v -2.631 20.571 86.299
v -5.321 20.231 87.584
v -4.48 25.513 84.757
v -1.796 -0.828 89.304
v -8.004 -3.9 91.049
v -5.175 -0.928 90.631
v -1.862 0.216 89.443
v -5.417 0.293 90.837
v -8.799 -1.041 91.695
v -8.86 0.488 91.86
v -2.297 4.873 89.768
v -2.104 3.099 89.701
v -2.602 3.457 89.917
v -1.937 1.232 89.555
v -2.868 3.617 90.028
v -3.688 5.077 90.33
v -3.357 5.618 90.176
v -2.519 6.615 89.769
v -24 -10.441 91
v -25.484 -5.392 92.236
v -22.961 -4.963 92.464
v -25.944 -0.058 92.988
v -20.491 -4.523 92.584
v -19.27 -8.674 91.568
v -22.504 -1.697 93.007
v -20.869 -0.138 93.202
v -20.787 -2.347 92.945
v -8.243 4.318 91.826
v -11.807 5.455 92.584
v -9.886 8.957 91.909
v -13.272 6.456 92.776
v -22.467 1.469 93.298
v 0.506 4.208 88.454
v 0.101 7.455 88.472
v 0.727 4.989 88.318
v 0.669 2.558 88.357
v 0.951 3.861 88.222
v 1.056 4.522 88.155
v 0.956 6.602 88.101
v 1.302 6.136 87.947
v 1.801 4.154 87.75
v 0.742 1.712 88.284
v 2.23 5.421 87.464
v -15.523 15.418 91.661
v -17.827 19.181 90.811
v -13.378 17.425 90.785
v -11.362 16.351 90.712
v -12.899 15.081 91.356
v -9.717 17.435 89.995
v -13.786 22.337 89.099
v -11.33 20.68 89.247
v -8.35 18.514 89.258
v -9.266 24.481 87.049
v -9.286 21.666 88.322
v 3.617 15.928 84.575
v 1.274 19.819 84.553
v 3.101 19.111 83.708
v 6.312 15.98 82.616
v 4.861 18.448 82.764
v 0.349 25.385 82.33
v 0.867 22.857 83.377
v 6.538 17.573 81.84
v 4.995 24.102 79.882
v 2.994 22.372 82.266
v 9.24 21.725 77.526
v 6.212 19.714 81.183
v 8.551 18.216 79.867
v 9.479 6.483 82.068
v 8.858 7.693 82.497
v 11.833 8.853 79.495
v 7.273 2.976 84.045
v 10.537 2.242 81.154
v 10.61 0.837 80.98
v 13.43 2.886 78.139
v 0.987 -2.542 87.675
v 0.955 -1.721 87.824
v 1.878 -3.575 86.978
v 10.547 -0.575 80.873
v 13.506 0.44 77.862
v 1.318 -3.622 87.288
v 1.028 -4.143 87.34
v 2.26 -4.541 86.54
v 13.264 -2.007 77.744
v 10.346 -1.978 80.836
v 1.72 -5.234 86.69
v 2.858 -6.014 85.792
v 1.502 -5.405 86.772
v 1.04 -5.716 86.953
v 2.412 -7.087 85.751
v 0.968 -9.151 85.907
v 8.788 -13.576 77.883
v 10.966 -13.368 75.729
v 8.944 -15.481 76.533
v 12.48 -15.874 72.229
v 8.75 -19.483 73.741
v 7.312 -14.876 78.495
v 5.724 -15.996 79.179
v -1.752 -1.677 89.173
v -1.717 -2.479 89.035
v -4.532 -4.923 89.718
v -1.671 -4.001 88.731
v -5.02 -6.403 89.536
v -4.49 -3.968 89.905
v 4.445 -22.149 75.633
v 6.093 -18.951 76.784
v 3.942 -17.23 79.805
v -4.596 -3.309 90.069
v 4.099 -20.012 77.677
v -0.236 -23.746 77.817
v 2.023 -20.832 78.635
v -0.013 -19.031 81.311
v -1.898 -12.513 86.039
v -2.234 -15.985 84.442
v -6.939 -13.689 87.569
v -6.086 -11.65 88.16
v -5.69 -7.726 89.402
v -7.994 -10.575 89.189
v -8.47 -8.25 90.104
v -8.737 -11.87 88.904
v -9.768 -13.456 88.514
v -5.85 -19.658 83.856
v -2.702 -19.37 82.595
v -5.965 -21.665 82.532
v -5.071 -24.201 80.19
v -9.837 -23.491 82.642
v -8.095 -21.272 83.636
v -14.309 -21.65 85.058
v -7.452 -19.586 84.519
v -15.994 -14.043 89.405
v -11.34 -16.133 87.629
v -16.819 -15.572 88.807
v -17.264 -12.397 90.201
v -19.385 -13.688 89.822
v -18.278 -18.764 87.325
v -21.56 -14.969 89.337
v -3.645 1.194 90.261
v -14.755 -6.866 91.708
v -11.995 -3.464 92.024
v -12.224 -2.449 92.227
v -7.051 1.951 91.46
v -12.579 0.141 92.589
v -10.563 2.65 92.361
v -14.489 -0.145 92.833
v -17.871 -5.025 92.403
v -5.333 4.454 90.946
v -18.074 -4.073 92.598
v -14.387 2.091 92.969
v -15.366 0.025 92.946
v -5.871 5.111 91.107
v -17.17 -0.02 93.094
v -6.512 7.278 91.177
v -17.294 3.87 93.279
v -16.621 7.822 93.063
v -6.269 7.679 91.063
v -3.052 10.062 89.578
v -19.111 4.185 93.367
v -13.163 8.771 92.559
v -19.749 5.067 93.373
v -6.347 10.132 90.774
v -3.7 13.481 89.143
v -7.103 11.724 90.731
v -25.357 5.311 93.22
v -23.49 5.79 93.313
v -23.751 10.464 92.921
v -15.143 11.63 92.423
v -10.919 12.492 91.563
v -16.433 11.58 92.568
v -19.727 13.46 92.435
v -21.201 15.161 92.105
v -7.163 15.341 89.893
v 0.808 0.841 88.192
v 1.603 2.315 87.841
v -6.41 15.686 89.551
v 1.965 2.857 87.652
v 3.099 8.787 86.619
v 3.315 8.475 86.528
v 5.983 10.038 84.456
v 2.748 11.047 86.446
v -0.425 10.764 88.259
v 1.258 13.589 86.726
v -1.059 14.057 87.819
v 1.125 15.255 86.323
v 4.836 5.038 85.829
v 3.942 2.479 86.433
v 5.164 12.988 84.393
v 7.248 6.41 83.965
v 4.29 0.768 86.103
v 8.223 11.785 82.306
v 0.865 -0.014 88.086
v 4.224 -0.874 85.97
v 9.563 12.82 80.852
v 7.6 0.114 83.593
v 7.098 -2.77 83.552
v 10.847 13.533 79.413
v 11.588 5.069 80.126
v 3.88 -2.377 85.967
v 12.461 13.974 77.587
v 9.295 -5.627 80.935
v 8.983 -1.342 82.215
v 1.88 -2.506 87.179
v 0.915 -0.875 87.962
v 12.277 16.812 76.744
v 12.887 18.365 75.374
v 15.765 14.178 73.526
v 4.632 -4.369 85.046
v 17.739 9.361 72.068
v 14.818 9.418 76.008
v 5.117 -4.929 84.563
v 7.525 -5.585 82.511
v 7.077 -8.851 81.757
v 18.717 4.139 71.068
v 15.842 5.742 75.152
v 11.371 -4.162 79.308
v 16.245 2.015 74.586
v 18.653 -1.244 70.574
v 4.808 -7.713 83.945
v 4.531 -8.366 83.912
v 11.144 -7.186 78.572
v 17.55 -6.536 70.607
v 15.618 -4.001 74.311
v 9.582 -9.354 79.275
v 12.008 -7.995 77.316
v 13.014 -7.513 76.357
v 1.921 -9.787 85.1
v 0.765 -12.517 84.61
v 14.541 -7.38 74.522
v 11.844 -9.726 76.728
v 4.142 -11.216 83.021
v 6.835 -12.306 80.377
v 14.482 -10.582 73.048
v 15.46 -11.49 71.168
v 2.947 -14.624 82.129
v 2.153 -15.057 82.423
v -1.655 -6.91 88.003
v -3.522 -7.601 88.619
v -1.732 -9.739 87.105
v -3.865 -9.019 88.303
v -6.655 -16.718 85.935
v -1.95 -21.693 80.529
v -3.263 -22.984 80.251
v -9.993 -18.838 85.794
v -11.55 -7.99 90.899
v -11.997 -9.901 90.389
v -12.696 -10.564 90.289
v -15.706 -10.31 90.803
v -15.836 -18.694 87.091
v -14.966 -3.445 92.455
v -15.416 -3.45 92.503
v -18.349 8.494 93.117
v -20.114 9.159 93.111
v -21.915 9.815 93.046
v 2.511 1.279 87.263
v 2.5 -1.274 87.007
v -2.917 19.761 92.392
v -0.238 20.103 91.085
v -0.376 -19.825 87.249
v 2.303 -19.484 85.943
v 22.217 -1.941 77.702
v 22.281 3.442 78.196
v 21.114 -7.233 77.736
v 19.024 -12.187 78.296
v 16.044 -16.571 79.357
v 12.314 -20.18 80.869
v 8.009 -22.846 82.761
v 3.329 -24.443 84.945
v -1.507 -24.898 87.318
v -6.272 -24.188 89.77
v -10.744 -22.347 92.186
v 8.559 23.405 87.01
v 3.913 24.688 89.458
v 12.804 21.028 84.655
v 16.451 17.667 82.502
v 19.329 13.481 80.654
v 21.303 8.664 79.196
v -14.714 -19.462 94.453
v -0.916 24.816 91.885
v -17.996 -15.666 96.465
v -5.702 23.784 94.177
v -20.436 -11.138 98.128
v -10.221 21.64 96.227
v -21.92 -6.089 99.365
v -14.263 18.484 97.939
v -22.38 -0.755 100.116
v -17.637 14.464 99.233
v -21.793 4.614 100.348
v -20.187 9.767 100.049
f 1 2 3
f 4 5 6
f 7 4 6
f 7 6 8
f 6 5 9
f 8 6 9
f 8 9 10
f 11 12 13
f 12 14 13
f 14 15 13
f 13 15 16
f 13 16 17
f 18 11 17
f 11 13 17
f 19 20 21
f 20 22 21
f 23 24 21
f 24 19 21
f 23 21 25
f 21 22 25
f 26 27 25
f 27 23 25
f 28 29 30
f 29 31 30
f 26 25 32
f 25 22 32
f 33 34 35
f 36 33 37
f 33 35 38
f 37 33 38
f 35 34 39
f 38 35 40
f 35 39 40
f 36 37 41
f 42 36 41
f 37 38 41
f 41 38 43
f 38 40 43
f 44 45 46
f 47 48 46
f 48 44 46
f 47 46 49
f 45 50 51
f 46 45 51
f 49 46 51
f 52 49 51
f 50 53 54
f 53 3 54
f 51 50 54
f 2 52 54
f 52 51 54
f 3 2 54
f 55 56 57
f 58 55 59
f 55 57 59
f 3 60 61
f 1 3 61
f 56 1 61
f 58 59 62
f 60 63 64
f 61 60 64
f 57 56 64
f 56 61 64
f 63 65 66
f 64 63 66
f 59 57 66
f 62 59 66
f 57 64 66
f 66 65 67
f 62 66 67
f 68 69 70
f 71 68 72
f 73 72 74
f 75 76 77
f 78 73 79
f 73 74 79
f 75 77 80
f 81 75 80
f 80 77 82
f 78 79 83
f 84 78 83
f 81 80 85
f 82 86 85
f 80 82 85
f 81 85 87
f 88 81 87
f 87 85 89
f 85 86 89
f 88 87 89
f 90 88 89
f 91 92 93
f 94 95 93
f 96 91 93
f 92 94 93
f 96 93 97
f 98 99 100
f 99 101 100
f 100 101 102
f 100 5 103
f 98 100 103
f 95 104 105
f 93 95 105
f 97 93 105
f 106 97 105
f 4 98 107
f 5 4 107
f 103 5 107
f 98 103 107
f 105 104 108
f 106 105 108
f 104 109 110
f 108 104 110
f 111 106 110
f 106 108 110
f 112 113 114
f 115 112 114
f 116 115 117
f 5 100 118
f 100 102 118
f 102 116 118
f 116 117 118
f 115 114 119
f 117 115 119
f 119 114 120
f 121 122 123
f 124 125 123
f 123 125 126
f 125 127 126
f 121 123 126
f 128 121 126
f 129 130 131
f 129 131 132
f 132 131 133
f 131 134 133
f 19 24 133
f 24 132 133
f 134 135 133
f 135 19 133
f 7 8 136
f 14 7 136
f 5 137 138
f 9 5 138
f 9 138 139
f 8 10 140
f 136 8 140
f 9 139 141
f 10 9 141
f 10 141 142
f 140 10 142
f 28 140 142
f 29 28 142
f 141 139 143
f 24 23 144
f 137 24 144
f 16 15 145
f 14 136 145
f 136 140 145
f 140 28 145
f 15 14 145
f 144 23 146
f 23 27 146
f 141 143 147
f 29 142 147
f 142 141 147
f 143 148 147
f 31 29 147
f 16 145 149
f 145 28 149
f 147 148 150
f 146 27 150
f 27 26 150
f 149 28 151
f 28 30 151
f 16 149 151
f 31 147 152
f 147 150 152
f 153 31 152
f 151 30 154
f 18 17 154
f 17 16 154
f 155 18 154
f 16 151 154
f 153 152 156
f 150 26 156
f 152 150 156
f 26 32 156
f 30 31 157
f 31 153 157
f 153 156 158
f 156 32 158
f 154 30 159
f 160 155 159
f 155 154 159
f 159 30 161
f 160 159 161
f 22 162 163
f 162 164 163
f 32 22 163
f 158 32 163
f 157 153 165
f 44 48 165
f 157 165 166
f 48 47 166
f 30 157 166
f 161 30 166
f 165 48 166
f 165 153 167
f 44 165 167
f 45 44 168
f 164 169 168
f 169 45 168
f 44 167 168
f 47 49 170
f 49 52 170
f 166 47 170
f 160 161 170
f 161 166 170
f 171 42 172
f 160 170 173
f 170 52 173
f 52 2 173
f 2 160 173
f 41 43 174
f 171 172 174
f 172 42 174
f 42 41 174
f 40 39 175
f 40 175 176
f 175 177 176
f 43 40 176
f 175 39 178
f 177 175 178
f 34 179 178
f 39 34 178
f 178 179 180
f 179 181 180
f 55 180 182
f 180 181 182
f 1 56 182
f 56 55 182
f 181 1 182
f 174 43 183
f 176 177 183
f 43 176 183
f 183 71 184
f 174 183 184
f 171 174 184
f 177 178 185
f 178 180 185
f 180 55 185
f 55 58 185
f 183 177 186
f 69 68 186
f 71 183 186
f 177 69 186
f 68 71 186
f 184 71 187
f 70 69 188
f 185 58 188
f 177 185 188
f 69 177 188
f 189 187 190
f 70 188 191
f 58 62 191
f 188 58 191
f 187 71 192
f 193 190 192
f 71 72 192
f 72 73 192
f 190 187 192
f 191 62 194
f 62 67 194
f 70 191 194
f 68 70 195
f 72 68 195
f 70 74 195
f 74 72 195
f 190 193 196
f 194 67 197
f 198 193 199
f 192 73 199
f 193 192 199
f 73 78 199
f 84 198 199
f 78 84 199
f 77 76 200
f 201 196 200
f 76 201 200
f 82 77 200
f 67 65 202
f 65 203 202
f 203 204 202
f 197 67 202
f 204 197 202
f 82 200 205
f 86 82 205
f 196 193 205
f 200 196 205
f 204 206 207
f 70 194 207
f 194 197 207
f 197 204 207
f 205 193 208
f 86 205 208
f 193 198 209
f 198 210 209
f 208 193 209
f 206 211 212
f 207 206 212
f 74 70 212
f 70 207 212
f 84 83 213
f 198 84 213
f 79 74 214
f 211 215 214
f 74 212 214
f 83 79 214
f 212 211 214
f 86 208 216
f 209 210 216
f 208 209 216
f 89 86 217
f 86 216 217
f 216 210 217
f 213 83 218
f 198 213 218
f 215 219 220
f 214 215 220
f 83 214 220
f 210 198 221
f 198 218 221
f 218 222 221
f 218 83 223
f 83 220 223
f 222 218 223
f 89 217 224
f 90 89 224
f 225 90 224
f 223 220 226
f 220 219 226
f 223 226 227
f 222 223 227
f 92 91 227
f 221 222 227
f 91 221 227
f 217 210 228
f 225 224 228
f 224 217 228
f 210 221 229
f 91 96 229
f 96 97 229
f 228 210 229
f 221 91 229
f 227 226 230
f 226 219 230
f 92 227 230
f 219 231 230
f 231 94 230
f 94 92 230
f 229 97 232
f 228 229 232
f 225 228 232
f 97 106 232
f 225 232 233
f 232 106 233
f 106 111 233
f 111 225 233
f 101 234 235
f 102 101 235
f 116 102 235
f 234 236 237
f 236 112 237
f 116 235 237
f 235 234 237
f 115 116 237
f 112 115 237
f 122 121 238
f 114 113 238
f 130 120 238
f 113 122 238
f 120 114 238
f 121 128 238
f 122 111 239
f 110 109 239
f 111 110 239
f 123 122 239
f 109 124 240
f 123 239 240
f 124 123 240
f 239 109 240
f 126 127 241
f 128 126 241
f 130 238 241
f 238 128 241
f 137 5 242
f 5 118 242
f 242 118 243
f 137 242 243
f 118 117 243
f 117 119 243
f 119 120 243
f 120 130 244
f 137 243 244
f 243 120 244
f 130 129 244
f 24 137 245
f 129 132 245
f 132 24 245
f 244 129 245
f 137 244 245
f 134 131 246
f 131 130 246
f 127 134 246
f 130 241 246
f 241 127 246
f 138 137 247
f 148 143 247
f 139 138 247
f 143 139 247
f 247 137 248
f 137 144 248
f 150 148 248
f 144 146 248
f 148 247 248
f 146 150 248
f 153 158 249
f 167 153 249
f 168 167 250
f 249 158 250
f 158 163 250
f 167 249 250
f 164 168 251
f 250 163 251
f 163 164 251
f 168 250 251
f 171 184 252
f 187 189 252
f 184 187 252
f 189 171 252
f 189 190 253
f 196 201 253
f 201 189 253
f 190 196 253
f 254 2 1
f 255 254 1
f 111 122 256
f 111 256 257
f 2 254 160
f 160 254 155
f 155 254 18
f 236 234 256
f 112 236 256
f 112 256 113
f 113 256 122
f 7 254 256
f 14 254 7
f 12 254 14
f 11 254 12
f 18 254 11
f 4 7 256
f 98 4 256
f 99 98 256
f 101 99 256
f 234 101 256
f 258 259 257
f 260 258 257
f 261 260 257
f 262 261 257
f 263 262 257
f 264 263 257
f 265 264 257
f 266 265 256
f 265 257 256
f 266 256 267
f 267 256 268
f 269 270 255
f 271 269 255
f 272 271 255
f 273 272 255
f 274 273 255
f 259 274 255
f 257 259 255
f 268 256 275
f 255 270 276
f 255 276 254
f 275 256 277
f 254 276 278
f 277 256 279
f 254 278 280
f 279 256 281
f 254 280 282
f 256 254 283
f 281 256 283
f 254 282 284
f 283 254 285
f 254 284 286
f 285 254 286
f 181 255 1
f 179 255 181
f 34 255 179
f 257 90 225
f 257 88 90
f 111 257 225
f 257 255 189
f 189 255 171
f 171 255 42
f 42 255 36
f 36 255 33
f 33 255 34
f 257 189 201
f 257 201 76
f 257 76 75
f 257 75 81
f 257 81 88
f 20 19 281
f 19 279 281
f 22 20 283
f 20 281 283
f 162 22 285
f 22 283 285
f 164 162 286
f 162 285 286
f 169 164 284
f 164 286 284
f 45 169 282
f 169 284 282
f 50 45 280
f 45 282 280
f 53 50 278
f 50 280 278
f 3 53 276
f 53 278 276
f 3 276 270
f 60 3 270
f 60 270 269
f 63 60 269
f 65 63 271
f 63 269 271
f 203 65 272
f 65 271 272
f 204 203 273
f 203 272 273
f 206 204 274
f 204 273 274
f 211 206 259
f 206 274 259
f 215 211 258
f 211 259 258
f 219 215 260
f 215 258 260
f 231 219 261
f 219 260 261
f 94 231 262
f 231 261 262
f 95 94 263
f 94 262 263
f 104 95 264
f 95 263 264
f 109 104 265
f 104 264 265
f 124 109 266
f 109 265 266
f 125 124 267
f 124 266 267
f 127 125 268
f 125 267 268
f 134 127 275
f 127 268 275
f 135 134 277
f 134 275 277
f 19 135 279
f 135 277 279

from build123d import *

# Parameters (mm, degrees)
BOX_W               = 3
BOX_H               = 18
BOX_DEPTH           = 40
BOX_PLACEMENT_ANGLE = 20
CUT_ROLL_ANGLE      = -73.158244
CUT_PITCH_ANGLE     = 21.416057
CUT_PLACEMENT_ANGLE = 28.591024


with BuildPart() as slot:
    # Box → Box (new body)
    with BuildSketch(Plane.XY):
        with Locations((1.5, 9)):
            Rectangle(BOX_W, BOX_H)
    extrude(amount=BOX_DEPTH)


with BuildPart() as slot_1:
    # Box placement: moved
    add(slot.part.moved(Location((-8.5, -6, -18))).rotate(Axis((-8.5, -6, -18), (0, 1, 0)), BOX_PLACEMENT_ANGLE))


with BuildPart() as soltted_parabolic_mirror:
    # Sketch → Revolve (revolve)
    with BuildSketch(Plane.XY):
        with BuildLine():
            Line((-25, 0), (0, 0))
            Line((0, 0), (0, 0.410997))
            add(Edge.make_bspline(
                [(0, 0.410997), (-12.5, 0.410997), (-25, 8)],
                knots=[0, 0, 0, 25, 25, 25], degree=2))
            Line((-25, 8), (-25, 0))
        make_face()
    revolve(axis=Axis((0, 0, 0), (0, 1, 0)))

    # Cut: cut slot
    add(slot_1.part, mode=Mode.SUBTRACT)


with BuildPart() as soltted_parabolic_mirror_1:
    # Cut roll: moved
    add(soltted_parabolic_mirror.part.rotate(Axis((0, 0, 0), (1, 0, 0)), CUT_ROLL_ANGLE))


with BuildPart() as soltted_parabolic_mirror_2:
    # Cut pitch: moved
    add(soltted_parabolic_mirror_1.part.rotate(Axis((0, 0, 0), (0, 1, 0)), CUT_PITCH_ANGLE))


with BuildPart() as soltted_parabolic_mirror_3:
    # Cut placement: moved
    add(soltted_parabolic_mirror_2.part.moved(Location((0, 0, 89))).rotate(Axis((0, 0, 89), (0, 0, 1)), CUT_PLACEMENT_ANGLE))


solid = soltted_parabolic_mirror_3.part
